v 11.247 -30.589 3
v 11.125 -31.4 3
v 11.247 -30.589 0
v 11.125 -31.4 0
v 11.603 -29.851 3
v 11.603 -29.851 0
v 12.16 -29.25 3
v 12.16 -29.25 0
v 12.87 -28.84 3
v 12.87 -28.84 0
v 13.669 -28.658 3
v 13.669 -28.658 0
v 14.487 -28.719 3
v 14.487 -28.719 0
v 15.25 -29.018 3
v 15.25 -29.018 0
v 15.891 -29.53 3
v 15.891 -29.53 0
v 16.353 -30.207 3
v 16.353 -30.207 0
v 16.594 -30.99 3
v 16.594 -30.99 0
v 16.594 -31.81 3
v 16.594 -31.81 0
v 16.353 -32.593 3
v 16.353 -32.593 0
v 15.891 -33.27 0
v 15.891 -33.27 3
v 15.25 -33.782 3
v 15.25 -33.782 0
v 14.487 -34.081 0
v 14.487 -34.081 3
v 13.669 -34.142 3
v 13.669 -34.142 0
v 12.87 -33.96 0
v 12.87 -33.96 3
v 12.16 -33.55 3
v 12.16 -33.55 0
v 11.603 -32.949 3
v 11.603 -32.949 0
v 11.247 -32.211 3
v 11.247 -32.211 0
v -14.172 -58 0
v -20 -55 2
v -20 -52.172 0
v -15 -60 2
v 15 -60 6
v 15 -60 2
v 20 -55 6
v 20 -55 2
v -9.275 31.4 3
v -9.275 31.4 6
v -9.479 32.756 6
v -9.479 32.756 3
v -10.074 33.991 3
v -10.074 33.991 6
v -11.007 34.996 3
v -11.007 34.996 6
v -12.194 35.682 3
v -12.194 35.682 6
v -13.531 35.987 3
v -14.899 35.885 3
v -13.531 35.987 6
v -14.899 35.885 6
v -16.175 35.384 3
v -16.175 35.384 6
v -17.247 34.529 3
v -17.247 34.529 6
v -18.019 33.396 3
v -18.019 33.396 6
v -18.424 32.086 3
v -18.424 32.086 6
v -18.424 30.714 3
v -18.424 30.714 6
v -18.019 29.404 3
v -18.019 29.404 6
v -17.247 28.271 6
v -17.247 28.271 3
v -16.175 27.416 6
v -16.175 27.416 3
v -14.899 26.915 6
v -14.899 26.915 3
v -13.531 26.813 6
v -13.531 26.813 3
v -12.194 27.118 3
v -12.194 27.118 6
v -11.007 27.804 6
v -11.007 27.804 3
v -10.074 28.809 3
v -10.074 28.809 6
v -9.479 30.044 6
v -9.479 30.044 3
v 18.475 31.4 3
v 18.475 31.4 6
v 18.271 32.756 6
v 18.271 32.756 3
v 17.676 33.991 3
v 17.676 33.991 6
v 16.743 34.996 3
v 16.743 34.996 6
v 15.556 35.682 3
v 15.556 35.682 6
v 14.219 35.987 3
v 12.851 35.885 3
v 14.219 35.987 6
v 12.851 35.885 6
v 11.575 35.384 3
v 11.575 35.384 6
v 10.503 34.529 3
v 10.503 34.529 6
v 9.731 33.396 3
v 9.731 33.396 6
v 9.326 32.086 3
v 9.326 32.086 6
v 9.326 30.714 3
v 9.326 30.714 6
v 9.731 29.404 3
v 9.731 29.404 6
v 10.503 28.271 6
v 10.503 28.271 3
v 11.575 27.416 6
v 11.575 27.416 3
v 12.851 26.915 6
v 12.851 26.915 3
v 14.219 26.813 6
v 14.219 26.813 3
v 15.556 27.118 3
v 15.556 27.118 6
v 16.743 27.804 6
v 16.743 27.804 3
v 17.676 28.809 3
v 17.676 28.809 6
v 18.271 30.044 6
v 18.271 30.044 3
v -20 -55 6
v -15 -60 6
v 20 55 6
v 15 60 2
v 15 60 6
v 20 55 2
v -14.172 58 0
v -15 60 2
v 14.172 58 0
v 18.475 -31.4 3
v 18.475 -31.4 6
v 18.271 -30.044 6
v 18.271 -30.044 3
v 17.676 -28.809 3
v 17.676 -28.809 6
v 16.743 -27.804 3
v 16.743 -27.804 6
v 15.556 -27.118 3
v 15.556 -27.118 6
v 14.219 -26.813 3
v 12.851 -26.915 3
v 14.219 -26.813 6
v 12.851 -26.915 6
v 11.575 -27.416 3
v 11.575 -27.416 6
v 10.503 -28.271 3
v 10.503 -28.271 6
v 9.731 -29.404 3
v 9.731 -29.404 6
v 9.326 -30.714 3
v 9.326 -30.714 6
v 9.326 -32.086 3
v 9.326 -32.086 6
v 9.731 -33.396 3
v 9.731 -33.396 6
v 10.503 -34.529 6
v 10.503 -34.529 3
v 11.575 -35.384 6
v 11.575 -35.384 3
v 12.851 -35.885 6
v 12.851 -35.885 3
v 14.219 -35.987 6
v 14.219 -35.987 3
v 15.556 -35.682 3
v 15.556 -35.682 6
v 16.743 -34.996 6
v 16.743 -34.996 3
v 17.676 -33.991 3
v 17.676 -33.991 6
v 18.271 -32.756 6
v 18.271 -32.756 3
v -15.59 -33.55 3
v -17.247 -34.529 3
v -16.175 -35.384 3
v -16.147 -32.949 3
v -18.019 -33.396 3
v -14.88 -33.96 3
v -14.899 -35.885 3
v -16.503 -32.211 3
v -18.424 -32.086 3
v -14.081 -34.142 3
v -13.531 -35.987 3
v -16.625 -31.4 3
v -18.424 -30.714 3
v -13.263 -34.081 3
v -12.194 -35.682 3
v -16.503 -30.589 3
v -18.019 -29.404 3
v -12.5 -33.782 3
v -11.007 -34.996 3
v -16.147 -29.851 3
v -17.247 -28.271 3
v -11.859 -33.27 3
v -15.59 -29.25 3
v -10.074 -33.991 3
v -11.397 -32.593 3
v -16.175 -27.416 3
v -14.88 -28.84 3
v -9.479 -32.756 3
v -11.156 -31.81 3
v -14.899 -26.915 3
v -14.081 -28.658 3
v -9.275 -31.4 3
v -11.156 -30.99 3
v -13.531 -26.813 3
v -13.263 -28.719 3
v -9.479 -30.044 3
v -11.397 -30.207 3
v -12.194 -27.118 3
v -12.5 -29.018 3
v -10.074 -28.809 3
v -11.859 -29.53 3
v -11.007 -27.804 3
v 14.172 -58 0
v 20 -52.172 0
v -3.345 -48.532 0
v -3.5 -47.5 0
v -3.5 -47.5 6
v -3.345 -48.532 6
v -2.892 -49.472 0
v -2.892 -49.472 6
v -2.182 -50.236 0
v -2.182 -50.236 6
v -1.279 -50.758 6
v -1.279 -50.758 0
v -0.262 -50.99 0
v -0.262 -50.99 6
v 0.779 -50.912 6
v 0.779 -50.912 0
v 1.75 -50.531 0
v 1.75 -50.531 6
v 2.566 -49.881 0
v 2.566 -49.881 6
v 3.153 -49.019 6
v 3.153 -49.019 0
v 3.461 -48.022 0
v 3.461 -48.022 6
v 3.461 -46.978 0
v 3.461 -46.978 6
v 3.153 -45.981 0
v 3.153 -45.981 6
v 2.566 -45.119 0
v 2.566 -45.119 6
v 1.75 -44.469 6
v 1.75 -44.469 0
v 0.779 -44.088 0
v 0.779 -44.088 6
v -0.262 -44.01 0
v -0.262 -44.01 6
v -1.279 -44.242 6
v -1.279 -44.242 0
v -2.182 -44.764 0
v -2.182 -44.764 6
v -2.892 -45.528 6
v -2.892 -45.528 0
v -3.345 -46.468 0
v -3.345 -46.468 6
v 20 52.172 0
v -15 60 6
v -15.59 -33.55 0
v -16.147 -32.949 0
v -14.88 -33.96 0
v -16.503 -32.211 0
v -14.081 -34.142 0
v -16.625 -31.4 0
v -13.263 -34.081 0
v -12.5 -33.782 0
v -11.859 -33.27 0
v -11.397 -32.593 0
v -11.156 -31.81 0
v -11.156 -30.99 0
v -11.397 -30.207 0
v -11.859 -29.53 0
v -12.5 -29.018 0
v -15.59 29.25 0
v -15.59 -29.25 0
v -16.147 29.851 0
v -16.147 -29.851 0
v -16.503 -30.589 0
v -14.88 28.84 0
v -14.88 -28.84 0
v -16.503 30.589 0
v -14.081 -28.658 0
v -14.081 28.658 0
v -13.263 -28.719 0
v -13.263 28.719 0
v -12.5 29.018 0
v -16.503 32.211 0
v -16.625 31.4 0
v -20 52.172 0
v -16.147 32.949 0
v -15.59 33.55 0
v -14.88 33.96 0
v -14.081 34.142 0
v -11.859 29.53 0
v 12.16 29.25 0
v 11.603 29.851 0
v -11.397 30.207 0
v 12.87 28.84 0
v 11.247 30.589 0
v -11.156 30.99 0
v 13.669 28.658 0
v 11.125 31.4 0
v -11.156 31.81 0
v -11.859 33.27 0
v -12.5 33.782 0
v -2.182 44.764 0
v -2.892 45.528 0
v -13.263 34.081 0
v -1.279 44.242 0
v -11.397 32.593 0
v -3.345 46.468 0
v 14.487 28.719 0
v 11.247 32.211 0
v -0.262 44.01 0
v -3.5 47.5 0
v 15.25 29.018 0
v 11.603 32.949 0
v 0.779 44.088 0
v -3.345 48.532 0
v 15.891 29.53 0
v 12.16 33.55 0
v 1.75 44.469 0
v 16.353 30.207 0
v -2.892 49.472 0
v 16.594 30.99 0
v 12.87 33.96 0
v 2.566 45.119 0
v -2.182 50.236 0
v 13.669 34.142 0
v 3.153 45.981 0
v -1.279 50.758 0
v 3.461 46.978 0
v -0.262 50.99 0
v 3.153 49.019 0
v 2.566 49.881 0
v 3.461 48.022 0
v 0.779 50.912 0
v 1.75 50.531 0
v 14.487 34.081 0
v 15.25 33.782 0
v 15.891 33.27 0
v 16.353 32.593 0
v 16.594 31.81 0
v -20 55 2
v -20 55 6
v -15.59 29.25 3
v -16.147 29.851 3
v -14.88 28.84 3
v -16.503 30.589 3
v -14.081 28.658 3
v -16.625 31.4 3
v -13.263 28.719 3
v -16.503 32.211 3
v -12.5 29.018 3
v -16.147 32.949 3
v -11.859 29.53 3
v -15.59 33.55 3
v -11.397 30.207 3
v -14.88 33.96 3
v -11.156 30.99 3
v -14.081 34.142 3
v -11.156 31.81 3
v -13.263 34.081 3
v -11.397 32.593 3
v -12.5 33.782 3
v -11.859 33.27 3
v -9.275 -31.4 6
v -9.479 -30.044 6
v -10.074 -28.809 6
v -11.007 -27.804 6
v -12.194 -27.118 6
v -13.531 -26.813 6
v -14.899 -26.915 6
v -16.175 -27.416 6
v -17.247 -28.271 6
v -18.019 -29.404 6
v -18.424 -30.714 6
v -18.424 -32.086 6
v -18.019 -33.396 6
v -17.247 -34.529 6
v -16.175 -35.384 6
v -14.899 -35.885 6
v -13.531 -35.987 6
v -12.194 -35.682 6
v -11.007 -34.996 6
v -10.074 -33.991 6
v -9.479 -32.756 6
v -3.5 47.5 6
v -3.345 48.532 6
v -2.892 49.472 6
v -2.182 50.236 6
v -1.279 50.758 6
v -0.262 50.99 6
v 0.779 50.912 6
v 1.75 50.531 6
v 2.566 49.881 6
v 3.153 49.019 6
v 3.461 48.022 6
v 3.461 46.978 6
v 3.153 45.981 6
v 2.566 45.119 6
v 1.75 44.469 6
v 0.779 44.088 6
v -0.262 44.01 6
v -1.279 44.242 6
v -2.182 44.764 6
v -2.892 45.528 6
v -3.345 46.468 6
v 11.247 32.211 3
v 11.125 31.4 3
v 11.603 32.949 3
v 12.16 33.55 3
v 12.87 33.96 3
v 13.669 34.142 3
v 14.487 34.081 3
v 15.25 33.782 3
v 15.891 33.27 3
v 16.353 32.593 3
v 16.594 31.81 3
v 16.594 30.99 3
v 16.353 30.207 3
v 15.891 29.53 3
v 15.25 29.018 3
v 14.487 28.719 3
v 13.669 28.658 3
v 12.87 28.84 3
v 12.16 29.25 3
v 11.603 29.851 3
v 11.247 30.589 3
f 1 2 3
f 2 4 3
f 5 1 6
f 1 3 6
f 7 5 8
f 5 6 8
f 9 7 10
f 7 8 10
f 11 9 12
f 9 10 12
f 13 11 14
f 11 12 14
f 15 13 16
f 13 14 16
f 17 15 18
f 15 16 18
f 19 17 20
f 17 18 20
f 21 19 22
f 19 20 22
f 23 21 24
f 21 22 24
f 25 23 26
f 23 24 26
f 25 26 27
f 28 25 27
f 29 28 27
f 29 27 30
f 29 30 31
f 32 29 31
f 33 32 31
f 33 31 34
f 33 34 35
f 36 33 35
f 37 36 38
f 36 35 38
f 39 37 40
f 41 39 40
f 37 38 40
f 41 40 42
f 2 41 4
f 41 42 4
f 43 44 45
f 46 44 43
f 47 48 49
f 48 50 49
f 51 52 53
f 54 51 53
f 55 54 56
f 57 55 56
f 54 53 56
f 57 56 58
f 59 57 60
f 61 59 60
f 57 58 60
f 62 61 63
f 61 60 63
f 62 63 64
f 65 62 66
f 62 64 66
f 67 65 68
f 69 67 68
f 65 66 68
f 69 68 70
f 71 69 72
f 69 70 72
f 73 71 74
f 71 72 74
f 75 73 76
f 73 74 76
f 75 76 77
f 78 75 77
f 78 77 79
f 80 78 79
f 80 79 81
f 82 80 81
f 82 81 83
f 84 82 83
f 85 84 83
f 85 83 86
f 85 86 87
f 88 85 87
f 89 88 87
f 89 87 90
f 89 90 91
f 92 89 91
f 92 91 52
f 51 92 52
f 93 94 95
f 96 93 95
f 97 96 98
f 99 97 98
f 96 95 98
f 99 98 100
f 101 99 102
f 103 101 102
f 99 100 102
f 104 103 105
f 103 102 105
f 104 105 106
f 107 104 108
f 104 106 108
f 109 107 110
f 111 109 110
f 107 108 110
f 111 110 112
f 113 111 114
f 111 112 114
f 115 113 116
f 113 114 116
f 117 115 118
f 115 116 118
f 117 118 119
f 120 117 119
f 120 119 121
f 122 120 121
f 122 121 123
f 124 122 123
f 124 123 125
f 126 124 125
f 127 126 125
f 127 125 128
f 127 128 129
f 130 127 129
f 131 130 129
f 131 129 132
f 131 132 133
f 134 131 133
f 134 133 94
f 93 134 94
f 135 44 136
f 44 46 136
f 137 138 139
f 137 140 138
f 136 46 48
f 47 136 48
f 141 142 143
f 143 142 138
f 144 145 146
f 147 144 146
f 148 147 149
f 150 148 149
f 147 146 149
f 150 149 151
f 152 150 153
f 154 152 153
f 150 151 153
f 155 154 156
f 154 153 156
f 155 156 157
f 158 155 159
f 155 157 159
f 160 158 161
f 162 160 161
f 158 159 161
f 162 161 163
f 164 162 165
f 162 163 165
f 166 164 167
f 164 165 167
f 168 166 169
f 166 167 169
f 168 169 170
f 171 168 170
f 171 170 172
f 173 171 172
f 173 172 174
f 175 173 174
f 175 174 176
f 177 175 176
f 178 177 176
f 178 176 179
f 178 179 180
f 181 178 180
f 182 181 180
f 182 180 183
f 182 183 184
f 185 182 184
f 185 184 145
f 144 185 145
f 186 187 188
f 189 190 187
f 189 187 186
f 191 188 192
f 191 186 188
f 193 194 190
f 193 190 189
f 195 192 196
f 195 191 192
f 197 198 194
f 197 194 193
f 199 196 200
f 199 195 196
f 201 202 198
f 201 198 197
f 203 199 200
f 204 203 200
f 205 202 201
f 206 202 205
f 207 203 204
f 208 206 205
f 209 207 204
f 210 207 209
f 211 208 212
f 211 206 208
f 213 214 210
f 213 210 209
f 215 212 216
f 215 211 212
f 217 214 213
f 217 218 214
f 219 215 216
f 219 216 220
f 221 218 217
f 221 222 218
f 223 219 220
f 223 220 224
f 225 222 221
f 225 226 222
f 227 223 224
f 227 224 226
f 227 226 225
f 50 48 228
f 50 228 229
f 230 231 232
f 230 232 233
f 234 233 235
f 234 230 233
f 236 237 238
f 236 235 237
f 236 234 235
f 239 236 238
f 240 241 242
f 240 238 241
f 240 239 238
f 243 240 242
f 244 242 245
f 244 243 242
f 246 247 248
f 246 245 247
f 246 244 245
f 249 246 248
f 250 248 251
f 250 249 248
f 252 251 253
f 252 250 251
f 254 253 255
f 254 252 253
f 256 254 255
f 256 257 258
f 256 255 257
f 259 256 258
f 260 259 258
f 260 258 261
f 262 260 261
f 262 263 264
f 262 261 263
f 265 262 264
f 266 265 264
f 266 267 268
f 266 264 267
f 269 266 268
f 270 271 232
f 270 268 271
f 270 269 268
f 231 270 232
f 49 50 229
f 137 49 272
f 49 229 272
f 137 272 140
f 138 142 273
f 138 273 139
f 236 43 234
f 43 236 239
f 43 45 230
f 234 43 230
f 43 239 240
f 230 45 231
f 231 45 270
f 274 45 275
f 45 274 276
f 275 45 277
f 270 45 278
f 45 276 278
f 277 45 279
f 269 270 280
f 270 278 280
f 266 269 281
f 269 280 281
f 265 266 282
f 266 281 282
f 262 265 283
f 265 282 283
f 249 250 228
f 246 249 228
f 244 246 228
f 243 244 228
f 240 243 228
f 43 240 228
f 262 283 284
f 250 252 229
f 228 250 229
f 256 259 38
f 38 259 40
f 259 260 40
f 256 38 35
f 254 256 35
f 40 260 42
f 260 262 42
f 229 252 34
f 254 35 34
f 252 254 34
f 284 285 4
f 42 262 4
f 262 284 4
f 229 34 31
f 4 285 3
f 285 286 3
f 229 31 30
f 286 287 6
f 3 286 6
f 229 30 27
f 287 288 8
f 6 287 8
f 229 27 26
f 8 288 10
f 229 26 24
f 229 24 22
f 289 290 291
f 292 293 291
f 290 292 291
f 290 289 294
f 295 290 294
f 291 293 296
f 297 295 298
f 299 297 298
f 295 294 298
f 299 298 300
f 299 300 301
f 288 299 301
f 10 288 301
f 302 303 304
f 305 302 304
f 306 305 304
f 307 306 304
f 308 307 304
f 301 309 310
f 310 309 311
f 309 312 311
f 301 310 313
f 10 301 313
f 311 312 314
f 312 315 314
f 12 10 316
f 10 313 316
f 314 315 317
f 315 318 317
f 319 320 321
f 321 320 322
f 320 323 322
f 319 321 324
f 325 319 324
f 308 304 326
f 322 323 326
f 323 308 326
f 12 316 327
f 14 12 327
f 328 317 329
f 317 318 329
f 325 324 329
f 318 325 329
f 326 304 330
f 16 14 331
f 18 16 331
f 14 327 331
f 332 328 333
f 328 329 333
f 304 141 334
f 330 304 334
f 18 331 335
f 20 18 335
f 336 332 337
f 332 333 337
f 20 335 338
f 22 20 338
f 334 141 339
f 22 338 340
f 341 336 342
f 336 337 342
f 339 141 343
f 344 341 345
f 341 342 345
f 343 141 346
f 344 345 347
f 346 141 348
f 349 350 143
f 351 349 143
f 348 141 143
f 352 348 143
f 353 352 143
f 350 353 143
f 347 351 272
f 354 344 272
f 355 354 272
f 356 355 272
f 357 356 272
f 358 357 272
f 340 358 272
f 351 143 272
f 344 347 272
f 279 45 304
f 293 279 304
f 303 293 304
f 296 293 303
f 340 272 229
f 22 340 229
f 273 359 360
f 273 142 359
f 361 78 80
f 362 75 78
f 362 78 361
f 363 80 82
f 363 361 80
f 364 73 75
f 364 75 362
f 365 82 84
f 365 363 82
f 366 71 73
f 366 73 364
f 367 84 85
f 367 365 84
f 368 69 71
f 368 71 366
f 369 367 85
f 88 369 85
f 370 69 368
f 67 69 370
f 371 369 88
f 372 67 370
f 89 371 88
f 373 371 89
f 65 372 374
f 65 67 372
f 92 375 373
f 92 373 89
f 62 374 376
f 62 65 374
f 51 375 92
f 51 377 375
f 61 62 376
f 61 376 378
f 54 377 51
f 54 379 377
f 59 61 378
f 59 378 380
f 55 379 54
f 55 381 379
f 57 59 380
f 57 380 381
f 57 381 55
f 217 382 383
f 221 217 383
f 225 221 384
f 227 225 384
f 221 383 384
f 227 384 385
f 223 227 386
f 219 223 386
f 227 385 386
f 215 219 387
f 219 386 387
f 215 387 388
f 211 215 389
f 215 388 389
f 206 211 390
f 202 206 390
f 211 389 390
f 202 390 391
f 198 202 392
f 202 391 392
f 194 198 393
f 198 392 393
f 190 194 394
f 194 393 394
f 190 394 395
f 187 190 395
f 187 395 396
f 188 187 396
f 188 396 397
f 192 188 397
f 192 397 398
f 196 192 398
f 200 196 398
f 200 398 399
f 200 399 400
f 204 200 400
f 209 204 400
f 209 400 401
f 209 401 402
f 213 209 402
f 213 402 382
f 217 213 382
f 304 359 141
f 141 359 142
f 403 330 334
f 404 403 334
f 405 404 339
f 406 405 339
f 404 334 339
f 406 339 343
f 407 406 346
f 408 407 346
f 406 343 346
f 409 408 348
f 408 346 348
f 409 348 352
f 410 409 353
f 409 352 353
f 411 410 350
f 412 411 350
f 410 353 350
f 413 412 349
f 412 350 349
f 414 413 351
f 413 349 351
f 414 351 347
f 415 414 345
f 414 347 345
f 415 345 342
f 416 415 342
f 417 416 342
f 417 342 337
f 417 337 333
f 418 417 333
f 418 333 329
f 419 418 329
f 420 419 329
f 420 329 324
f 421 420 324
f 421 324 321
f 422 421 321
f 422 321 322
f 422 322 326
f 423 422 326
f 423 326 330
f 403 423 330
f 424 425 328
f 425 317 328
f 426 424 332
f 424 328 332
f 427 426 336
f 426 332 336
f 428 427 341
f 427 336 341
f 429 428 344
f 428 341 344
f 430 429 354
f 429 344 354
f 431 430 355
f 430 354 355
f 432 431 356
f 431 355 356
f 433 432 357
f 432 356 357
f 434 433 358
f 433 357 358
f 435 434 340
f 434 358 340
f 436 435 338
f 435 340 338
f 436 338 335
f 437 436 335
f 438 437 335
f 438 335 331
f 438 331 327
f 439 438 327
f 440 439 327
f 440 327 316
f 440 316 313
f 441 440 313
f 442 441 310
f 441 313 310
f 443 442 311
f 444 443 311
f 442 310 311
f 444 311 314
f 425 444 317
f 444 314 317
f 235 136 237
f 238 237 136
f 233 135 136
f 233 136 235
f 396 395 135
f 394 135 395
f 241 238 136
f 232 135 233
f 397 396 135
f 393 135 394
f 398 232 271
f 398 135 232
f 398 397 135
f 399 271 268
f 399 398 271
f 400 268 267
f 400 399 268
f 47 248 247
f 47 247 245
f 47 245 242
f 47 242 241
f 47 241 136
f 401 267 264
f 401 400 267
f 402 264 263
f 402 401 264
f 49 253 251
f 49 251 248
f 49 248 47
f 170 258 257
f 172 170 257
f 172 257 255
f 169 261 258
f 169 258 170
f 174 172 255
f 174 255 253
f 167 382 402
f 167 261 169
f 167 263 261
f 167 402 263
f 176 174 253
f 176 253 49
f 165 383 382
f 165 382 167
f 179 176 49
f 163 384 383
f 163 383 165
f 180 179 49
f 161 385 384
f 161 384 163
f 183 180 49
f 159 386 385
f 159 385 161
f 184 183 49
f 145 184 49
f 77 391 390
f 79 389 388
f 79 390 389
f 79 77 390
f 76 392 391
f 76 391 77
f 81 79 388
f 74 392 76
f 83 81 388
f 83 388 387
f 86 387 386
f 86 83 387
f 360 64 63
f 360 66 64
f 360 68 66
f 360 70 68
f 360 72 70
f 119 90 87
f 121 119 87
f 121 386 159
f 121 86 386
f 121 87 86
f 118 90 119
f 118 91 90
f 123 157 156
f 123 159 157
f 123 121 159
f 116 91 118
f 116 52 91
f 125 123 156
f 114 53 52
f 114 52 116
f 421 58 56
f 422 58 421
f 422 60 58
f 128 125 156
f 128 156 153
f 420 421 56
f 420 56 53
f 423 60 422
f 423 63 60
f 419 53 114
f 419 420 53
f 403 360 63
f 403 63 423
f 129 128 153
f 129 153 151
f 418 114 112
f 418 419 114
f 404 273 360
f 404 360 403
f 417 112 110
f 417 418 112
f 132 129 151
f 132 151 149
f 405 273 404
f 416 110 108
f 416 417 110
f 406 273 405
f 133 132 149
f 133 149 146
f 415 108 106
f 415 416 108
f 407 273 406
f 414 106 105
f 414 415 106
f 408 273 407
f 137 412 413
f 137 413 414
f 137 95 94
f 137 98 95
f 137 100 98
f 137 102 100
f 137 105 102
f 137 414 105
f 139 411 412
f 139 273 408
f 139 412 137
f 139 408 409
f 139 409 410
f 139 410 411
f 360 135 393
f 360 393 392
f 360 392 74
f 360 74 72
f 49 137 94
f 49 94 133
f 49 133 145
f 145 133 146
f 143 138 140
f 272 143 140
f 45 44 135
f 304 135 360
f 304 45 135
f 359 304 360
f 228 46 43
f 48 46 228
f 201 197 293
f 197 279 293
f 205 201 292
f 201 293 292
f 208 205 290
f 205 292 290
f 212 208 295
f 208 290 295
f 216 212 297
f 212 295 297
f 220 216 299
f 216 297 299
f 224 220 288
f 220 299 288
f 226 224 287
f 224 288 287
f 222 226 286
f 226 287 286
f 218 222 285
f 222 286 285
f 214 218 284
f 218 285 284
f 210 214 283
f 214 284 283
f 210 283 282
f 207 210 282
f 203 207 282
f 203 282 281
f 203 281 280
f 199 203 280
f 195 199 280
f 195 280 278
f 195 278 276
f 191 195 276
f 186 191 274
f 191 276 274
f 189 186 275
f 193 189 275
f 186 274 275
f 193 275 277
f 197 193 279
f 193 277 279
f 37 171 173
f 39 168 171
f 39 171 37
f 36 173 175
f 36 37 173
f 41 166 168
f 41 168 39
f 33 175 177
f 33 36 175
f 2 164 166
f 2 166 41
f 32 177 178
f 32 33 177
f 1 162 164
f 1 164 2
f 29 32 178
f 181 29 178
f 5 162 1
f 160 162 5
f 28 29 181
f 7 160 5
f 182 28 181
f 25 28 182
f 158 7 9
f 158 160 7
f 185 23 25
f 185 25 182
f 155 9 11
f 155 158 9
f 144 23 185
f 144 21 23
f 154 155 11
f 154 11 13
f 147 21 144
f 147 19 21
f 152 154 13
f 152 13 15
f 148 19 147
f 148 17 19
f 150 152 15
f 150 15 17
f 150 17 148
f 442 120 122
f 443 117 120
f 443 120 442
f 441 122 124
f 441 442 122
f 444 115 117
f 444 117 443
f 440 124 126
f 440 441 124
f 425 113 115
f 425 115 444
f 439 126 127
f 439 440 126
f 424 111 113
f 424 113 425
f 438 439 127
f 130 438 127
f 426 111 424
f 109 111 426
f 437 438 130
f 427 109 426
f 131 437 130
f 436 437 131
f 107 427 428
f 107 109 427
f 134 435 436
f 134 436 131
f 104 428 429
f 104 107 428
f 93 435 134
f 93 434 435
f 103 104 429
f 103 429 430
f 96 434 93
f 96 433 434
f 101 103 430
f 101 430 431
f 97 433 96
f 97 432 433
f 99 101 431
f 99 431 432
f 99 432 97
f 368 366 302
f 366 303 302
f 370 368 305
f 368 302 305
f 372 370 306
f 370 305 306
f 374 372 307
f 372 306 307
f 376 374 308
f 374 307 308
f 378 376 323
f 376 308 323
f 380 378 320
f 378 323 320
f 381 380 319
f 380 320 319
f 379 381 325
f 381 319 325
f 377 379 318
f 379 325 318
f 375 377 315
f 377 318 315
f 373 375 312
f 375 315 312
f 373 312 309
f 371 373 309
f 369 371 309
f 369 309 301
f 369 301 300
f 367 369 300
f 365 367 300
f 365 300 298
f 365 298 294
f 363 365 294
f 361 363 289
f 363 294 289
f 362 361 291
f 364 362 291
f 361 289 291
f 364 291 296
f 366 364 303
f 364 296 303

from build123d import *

# Parameters (mm, degrees)
F0_W           = 40
F0_H           = 120
F1_DEPTH       = 6
F3_D           = 5.5
F3_DEPTH       = 15
F3_CBORE_D     = 9.2
F3_CBORE_DEPTH = 3
F3_TIP         = 1.6523667023
F5_D           = 7
F5_DEPTH       = 15
F5_TIP         = 2.1030121666
F6_SIZE        = 5
F7_SIZE        = 2


# Not quite as in the source:
# - a pattern or mirror of a feature is missing from the dataset's text; its kind, count and spacing are read off the source's solid


with BuildPart() as f1:
    # F0 (on Top) → F1 (new body)
    with BuildSketch(Plane.XY):
        Rectangle(F0_W, F0_H)
    extrude(amount=F1_DEPTH)

    # F3
    with Locations(Plane.XY.offset(6)):
        with Locations((-13.875, 31.4), (13.875, 31.4), (-13.875, -31.4), (13.875, -31.4)):
            CounterBoreHole(F3_D / 2, F3_CBORE_D / 2, F3_CBORE_DEPTH, depth=F3_DEPTH)
            with Locations((0, 0, -(F3_DEPTH + F3_TIP / 2))):  # 118° drill point
                Cone(0, F3_D / 2, F3_TIP, mode=Mode.SUBTRACT)

    # F5
    with Locations(Plane.XY.offset(6)):
        with Locations((0, 47.5)):
            f5 = Hole(F5_D / 2, depth=F5_DEPTH)
            with Locations((0, 0, -(F5_DEPTH + F5_TIP / 2))):  # 118° drill point
                Cone(0, F5_D / 2, F5_TIP, mode=Mode.SUBTRACT)

    # F5_copies: F5 across plane
    add(f5.mirror(Plane(origin=(0, 0, 0), x_dir=(0, 0, -1), z_dir=(0, -1, 0))), mode=Mode.SUBTRACT)

    # F6
    f6_edges = [f1.edges().sort_by_distance(p)[0] for p in [
        (20, 60, 3),
        (-20, 60, 3),
        (-20, -60, 3),
        (20, -60, 3),
    ]]
    chamfer(f6_edges, length=F6_SIZE)

    # F7
    f7_edges = [f1.edges().sort_by_distance(p)[0] for p in [
        (0, 60, 0),
        (-17.5, 57.5, 0),
        (17.5, 57.5, 0),
        (17.5, -57.5, 0),
        (0, -60, 0),
        (-17.5, -57.5, 0),
    ]]
    chamfer(f7_edges, length=F7_SIZE)


solid = f1.part
